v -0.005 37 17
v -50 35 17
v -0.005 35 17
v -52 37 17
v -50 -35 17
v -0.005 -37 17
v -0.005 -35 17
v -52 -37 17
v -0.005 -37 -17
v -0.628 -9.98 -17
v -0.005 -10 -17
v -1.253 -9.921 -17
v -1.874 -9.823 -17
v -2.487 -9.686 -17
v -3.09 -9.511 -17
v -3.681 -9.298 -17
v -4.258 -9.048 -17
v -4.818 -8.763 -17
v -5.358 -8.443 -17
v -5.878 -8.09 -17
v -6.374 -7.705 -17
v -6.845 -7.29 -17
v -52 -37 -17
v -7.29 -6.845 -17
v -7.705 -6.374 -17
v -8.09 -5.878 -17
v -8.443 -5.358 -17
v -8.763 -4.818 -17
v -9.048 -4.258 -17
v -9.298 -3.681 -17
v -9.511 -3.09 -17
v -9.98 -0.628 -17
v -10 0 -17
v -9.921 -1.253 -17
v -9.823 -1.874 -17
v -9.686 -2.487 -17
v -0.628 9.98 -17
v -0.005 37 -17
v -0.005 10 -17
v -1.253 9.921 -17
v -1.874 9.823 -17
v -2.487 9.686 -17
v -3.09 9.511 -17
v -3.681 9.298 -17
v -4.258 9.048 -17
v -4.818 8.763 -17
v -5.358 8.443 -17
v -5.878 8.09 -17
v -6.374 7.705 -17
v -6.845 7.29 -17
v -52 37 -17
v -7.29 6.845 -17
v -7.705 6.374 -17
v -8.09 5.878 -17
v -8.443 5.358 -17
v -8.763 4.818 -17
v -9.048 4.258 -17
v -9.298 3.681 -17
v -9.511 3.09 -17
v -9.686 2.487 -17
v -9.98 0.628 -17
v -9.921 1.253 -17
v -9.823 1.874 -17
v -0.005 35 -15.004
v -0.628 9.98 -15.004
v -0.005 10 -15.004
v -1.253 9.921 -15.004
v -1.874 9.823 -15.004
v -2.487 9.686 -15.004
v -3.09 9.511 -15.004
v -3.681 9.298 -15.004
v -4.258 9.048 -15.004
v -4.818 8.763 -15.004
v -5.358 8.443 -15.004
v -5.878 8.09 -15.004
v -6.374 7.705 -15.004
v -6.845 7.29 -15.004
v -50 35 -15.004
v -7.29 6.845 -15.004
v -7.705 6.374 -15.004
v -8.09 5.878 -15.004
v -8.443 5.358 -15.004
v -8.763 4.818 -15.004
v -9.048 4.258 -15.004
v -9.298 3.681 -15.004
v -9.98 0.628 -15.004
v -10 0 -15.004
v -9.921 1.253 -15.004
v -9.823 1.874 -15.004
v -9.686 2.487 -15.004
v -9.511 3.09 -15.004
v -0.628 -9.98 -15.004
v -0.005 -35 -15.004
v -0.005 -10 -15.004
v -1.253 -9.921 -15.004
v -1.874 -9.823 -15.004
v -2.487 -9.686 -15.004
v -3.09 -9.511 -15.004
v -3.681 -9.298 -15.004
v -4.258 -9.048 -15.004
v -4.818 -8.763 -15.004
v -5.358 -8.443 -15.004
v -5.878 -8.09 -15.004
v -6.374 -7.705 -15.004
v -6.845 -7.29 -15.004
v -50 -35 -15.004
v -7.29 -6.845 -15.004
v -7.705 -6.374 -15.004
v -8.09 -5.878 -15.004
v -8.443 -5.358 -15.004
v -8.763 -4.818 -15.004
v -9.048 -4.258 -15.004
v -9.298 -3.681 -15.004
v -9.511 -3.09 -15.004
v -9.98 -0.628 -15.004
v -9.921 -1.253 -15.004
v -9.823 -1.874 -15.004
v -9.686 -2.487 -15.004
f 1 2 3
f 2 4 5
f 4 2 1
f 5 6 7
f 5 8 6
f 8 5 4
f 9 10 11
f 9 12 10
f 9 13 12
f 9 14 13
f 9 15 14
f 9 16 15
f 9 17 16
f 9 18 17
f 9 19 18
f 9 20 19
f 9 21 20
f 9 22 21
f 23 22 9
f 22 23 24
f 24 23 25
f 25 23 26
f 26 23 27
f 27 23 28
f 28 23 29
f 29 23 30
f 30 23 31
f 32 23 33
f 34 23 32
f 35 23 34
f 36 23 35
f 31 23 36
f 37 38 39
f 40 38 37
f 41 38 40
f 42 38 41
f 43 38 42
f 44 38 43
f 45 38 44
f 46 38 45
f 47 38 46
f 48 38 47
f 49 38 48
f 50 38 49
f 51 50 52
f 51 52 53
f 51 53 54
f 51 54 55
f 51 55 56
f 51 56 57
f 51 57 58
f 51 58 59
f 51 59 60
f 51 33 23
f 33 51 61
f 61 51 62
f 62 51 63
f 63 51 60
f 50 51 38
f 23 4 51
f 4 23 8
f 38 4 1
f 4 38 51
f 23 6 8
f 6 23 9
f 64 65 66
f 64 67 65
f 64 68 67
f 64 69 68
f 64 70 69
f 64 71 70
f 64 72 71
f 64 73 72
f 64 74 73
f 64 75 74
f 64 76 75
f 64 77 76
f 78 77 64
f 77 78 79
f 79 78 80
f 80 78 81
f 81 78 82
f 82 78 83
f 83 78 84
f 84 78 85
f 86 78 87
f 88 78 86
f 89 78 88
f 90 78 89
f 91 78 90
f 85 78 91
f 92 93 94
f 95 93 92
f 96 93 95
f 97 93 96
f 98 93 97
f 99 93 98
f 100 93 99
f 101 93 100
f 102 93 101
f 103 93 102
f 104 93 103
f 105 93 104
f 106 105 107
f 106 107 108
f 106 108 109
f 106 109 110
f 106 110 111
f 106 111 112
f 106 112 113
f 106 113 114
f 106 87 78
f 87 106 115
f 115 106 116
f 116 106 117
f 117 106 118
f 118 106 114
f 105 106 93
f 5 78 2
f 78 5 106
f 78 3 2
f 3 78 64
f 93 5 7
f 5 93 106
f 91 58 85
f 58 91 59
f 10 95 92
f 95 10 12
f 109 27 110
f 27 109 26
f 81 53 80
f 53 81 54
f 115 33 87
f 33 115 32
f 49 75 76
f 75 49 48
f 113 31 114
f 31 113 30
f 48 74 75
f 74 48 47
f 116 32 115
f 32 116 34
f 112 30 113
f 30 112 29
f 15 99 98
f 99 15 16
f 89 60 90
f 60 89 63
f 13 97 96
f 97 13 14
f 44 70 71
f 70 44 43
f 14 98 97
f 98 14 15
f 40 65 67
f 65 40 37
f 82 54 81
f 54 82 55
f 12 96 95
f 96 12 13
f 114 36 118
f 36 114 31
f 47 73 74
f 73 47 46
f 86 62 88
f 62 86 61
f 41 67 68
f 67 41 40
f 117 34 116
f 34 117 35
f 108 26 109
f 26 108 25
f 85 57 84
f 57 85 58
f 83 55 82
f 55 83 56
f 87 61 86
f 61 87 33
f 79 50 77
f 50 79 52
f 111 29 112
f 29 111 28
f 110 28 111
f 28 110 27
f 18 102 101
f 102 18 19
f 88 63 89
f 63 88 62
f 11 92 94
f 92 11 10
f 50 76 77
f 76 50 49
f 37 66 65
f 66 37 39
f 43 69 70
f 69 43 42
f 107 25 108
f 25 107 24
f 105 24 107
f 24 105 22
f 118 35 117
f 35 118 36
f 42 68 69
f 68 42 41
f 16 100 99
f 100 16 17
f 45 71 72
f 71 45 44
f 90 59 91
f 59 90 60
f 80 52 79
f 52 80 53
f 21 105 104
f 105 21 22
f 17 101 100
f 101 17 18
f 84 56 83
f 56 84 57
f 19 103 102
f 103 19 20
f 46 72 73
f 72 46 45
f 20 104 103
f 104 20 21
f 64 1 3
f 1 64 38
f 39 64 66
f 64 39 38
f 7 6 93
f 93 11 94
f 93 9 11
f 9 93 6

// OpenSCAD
eps=1/128;
$fn=100;

t=0.01;

difference() {
    cube([104, 74, 34], center=true);
    translate([0,0,2]) cube([100, 70, 34+eps], center=true);
    translate([0,0,-10]) cylinder(30,10,10, center=true);
    translate([110/2-(t/2),0,0]) cube([110, 80, 40], center=true);
}

module tray() {
    union() {
        difference() {
            cube([108+t*2, 78+t*2, 10], center=true);
            translate([0,0,34/2-3]) cube([104+t*2, 74+t*2, 34], center=true);
        }
        translate([0,0,-2]) cylinder(2,10-t*2,10-t*2, center=true);
    }
}
